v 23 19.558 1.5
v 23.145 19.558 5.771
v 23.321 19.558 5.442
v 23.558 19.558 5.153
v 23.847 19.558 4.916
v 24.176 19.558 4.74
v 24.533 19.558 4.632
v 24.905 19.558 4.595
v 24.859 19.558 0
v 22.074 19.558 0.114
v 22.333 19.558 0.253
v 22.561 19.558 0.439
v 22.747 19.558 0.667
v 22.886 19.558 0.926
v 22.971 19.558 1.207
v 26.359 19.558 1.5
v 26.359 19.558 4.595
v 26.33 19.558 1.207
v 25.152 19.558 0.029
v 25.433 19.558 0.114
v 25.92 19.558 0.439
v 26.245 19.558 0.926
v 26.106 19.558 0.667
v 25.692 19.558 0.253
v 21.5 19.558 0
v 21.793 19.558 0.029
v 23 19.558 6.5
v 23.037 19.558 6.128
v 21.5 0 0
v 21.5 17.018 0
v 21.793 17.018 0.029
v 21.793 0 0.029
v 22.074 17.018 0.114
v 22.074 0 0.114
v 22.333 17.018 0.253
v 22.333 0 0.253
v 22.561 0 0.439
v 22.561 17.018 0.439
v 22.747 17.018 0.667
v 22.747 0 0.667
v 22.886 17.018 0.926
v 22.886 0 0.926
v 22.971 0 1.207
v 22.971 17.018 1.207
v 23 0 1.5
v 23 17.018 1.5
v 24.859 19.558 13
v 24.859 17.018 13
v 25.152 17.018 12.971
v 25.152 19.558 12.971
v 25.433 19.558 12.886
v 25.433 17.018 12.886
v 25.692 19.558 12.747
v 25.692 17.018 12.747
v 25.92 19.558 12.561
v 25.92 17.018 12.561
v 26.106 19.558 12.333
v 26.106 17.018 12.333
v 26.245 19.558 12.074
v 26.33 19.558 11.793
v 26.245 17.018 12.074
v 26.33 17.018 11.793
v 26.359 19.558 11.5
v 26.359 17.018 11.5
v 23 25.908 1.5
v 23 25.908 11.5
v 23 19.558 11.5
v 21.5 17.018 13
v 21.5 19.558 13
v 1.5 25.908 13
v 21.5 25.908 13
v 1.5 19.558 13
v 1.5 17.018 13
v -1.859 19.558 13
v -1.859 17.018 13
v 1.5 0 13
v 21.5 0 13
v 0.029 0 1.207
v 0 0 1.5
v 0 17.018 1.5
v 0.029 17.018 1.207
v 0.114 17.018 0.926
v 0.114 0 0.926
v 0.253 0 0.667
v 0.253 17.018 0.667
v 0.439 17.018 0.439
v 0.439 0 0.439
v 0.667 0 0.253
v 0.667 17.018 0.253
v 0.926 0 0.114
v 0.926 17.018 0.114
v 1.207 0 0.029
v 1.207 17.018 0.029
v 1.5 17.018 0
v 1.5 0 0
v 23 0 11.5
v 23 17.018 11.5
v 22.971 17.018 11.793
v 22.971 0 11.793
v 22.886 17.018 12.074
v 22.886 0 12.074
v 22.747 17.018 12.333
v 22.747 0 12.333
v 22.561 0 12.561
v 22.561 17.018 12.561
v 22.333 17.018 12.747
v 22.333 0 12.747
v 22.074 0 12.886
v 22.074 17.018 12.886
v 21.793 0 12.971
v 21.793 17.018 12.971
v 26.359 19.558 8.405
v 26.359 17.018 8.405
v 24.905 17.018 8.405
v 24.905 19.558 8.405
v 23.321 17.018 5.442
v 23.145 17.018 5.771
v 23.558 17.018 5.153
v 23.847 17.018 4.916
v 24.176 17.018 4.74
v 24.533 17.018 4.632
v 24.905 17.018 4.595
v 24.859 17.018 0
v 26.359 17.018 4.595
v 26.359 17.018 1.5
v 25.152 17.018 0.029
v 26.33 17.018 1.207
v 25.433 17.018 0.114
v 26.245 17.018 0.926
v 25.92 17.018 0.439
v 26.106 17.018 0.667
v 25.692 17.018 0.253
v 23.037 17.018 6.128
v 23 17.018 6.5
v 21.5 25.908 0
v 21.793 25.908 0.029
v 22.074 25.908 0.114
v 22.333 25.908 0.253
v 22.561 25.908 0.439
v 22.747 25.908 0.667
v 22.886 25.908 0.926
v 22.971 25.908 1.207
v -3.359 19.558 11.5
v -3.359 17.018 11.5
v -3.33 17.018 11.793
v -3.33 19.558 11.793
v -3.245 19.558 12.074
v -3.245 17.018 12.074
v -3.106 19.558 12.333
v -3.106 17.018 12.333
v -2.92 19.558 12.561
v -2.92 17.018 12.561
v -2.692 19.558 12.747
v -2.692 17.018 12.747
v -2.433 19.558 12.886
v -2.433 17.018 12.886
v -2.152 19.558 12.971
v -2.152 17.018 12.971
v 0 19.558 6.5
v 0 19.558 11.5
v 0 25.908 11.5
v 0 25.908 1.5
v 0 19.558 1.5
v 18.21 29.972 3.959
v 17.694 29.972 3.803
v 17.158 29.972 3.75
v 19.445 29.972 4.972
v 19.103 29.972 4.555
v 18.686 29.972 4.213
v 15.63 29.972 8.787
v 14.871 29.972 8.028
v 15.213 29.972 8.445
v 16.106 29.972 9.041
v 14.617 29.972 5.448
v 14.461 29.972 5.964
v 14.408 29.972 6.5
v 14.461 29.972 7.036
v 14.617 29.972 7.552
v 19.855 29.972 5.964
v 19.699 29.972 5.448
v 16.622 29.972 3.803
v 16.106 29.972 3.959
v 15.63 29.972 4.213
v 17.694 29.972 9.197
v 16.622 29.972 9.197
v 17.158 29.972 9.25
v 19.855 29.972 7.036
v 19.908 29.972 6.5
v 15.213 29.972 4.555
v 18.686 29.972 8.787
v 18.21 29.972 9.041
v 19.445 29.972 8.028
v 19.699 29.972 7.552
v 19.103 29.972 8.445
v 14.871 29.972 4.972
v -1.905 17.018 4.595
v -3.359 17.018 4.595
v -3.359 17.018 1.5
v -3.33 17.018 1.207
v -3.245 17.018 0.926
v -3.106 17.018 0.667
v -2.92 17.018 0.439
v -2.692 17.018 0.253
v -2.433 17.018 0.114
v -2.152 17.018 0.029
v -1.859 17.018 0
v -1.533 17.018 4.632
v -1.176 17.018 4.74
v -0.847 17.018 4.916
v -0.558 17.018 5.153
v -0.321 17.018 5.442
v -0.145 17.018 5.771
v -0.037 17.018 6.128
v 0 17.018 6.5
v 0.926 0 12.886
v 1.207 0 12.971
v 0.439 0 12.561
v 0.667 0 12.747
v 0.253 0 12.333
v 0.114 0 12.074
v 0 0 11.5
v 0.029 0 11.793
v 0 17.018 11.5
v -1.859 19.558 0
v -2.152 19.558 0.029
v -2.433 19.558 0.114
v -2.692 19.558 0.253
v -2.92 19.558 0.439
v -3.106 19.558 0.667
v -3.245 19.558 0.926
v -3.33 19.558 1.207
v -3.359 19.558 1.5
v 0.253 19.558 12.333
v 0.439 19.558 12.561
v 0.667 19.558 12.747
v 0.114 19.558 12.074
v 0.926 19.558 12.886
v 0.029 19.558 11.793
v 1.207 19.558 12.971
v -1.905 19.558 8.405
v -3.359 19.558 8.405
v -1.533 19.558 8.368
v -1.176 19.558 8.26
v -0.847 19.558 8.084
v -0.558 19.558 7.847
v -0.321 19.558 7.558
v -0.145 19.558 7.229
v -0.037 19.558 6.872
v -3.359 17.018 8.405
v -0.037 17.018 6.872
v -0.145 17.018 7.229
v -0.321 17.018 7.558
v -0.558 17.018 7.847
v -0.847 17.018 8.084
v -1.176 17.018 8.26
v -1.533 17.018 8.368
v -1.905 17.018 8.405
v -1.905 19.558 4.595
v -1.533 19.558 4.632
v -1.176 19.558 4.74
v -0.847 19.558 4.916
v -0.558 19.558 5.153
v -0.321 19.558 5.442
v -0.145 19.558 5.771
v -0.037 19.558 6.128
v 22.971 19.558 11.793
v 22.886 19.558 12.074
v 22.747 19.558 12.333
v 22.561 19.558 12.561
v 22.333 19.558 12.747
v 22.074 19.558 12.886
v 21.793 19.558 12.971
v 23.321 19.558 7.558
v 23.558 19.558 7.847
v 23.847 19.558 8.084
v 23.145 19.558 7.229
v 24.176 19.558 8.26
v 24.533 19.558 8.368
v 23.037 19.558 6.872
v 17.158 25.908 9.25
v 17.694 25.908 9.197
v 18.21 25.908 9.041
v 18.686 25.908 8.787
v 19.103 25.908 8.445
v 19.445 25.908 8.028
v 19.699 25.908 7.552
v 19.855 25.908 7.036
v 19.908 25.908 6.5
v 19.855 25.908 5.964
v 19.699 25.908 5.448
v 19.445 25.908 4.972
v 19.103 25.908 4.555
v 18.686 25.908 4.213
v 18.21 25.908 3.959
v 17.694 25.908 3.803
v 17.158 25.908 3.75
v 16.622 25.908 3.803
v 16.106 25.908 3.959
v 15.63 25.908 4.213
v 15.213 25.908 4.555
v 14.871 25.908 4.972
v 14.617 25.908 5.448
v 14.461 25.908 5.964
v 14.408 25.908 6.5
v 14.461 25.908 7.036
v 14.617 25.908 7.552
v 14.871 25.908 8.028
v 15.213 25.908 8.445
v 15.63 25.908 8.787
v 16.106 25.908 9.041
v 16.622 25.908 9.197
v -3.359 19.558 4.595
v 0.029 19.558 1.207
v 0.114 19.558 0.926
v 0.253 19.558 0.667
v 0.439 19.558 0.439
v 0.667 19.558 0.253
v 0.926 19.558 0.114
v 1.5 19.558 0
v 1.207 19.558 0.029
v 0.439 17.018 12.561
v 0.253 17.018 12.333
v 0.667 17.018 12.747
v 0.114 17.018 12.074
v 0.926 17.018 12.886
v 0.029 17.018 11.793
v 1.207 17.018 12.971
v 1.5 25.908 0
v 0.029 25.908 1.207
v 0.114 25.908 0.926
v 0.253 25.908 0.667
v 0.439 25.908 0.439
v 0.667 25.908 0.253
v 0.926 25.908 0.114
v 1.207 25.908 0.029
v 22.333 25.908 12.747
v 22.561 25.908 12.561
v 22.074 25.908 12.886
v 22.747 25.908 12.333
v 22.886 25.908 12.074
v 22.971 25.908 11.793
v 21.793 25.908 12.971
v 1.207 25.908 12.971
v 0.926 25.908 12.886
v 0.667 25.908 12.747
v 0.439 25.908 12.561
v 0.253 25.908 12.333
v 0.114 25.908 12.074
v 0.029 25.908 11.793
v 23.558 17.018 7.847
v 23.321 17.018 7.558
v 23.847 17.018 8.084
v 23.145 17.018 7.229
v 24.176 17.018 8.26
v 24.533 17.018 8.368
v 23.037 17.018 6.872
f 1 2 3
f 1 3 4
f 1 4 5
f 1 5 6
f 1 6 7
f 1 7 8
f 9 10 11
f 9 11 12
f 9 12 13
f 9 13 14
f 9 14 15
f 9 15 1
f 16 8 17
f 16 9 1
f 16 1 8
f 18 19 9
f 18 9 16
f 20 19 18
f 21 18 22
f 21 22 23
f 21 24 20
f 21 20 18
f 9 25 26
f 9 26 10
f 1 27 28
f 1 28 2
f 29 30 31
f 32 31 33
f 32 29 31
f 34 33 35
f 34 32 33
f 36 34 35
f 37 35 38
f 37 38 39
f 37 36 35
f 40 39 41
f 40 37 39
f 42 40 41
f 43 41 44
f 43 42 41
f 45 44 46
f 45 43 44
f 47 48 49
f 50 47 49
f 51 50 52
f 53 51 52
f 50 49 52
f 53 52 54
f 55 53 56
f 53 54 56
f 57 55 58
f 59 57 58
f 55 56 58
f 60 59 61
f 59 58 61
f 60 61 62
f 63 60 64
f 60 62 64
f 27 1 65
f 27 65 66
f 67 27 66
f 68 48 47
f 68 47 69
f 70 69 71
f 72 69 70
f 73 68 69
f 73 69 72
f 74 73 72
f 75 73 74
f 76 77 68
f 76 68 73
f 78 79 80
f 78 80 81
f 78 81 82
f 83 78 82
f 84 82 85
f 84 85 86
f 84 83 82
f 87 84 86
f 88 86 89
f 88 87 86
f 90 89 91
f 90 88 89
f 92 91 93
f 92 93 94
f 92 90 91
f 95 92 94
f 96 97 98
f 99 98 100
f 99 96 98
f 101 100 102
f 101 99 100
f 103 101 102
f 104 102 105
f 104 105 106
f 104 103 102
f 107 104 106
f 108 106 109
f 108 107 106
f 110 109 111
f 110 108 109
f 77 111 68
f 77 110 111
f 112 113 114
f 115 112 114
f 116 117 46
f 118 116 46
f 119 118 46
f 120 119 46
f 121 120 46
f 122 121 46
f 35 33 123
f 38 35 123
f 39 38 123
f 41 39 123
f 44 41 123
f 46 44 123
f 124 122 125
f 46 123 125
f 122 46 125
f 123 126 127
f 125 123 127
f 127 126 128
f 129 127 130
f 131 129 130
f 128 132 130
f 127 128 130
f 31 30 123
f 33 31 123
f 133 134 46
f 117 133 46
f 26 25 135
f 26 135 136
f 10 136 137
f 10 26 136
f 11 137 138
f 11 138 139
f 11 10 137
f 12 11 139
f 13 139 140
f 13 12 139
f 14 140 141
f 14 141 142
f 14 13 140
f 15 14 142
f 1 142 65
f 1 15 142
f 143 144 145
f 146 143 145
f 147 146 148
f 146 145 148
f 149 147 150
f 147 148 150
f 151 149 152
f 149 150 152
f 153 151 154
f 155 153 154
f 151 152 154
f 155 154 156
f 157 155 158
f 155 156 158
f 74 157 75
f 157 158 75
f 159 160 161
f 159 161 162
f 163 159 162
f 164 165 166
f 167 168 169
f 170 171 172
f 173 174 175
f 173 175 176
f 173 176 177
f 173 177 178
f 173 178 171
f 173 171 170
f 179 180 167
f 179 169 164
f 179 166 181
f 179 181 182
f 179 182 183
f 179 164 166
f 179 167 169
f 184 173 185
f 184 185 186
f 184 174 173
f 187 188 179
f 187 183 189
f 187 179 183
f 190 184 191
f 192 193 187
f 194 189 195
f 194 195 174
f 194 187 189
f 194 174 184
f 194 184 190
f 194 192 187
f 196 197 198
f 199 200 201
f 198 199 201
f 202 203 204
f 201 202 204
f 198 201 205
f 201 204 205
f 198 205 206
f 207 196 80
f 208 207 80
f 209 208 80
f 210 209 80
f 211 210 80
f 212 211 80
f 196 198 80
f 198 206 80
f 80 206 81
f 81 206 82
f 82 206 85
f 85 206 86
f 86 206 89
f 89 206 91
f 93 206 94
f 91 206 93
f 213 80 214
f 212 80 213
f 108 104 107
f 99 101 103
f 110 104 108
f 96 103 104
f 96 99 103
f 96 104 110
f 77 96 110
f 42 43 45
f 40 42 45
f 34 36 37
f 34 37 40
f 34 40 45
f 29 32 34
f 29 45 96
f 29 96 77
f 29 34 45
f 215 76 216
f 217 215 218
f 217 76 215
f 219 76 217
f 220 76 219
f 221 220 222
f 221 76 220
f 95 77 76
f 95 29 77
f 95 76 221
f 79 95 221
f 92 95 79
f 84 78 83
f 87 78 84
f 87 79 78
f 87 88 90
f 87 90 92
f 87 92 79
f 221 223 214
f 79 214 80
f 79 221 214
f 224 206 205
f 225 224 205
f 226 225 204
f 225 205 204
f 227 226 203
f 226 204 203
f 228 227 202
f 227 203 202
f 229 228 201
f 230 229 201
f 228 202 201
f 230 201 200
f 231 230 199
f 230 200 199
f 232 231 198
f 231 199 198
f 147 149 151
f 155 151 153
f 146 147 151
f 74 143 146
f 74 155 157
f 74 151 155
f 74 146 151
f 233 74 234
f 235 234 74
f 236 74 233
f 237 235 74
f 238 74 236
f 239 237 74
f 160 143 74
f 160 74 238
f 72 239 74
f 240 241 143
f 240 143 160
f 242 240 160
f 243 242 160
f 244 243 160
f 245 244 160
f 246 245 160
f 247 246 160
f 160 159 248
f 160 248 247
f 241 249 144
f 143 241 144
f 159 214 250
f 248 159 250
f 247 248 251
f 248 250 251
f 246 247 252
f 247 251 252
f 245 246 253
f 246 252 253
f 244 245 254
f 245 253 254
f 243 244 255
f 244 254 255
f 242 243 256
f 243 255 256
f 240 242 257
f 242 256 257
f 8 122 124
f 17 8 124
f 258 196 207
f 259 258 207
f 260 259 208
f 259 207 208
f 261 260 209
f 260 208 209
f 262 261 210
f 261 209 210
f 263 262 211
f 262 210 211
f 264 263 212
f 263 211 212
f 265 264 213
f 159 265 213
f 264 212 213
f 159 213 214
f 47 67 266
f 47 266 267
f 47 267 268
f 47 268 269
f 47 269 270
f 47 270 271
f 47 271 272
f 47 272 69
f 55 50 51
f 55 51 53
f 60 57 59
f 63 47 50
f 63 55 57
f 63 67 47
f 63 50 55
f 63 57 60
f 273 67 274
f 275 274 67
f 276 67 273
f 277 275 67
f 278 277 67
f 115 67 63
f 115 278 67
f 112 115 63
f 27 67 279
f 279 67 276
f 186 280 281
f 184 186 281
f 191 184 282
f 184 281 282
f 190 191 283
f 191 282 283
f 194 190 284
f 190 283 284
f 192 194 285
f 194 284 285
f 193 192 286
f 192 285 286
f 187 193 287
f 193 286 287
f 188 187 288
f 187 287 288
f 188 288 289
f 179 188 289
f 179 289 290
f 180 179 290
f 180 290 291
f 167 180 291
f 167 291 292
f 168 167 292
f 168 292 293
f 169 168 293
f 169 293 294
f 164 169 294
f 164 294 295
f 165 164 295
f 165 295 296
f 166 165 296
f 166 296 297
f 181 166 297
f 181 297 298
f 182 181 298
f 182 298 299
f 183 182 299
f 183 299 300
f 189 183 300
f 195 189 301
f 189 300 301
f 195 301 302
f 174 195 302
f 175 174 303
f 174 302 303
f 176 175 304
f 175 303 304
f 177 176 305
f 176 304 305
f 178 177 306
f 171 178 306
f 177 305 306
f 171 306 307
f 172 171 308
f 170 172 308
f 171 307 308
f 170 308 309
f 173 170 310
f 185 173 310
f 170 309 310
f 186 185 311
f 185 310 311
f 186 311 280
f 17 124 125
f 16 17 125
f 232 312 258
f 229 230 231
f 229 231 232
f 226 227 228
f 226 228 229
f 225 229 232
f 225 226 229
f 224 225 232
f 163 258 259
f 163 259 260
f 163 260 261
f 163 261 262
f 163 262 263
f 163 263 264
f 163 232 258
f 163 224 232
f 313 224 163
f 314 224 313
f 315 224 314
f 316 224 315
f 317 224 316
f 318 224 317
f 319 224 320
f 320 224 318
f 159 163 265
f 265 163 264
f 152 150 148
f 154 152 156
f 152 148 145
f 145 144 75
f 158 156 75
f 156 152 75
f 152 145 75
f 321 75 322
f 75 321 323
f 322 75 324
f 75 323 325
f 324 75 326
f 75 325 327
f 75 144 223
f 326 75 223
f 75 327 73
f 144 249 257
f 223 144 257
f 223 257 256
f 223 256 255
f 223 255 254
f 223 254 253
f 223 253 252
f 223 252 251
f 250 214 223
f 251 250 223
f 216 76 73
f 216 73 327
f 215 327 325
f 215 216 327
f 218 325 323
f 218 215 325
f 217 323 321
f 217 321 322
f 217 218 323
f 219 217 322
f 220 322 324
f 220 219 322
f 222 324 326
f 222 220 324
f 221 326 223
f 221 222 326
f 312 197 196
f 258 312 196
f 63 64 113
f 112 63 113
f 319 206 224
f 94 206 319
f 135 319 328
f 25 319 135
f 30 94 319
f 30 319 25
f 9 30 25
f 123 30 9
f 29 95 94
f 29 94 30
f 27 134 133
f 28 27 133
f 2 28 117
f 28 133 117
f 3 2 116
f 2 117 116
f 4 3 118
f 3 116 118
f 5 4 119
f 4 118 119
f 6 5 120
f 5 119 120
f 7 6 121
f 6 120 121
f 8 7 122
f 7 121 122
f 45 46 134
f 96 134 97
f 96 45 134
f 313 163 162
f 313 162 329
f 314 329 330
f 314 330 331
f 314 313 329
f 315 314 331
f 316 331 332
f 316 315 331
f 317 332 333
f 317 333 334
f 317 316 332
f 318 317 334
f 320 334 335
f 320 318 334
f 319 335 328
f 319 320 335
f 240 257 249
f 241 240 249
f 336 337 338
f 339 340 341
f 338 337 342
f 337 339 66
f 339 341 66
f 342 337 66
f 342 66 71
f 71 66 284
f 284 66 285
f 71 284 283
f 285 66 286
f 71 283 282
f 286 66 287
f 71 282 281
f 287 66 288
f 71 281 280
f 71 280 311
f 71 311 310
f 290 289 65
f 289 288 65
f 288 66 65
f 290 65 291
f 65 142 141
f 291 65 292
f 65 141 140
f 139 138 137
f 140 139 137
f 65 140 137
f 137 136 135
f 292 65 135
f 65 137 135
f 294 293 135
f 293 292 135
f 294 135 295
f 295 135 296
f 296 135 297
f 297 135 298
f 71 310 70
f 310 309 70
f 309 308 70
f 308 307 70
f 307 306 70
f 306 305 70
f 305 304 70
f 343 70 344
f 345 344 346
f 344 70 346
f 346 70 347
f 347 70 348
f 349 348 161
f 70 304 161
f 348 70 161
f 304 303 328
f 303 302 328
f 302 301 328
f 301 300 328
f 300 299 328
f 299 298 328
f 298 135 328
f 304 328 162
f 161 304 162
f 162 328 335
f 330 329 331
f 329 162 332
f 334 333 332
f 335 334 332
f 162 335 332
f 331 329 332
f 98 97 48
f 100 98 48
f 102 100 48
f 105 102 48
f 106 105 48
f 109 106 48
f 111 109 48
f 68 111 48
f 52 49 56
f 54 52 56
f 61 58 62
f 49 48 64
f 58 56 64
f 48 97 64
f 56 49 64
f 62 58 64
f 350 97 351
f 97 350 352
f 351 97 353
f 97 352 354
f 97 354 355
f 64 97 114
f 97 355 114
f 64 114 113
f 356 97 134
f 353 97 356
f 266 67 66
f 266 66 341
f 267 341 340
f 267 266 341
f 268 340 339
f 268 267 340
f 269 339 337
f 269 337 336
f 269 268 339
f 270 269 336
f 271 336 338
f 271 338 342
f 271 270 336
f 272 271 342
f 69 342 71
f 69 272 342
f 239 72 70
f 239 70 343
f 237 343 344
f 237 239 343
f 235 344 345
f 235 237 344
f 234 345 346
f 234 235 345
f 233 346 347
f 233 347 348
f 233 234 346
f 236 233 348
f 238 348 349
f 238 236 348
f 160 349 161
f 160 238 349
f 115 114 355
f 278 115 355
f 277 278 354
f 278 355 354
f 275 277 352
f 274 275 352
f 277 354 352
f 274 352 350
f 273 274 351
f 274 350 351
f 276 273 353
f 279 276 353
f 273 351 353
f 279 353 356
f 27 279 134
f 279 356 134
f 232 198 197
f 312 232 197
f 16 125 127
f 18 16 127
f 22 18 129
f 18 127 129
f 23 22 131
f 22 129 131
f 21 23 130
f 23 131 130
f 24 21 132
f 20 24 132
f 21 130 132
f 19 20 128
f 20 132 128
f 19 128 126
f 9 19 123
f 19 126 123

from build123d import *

# Parameters (mm, degrees)
BOSS_EXTRUDE1_DEPTH = 17.018
BOSS_EXTRUDE2_DEPTH = 2.54
BOSS_EXTRUDE3_DEPTH = 6.35
SKETCH4_4_R         = 2.75
BOSS_EXTRUDE4_DEPTH = 10.414


with BuildPart() as part:
    # Sketch2 → Boss-Extrude1 (new body)
    with BuildSketch(Plane(origin=(0, 0, 0), x_dir=(1, 0, 0), z_dir=(0, 1, 0))):
        with BuildLine():
            Line((1.5, 0), (21.5, 0))
            ThreePointArc((21.5, 0), (22.560660172, -0.439339828), (23, -1.5))
            Line((23, -1.5), (23, -11.5))
            ThreePointArc((23, -11.5), (22.560660172, -12.560660172), (21.5, -13))
            Line((21.5, -13), (1.5, -13))
            ThreePointArc((1.5, -13), (0.439339828, -12.560660172), (0, -11.5))
            Line((0, -11.5), (0, -1.5))
            ThreePointArc((0, -1.5), (0.439339828, -0.439339828), (1.5, 0))
        make_face()
    extrude(amount=BOSS_EXTRUDE1_DEPTH)

    # Sketch3 → Boss-Extrude2 (add)
    with BuildSketch(Plane(origin=(0, 17.018, 0), x_dir=(1, 0, 0), z_dir=(0, 1, 0))):
        with BuildLine():
            ThreePointArc((-1.859, 0), (-2.919660172, -0.439339828), (-3.359, -1.5))
            Line((-3.359, -1.5), (-3.359, -4.595))
            Line((-3.359, -4.595), (-1.905, -4.595))
            ThreePointArc((-1.905, -4.595), (0, -6.5), (-1.905, -8.405))
            Line((-1.905, -8.405), (-3.359, -8.405))
            Line((-3.359, -8.405), (-3.359, -11.5))
            ThreePointArc((-3.359, -11.5), (-2.919660172, -12.560660172), (-1.859, -13))
            Line((-1.859, -13), (24.859, -13))
            ThreePointArc((24.859, -13), (25.919660172, -12.560660172), (26.359, -11.5))
            Line((26.359, -11.5), (26.359, -8.405))
            Line((26.359, -8.405), (24.905, -8.405))
            ThreePointArc((24.905, -8.405), (23, -6.5), (24.905, -4.595))
            Line((24.905, -4.595), (26.359, -4.595))
            Line((26.359, -4.595), (26.359, -1.5))
            ThreePointArc((26.359, -1.5), (25.919660172, -0.439339828), (24.859, 0))
            Line((24.859, 0), (-1.859, 0))
        make_face()
    extrude(amount=BOSS_EXTRUDE2_DEPTH)

    # Sketch4 → Boss-Extrude3 (add)
    with BuildSketch(Plane(origin=(0, 19.558, 0), x_dir=(1, 0, 0), z_dir=(0, 1, 0))):
        with BuildLine():
            Line((1.5, 0), (21.5, 0))
            ThreePointArc((21.5, 0), (22.560660172, -0.439339828), (23, -1.5))
            Line((23, -1.5), (23, -11.5))
            ThreePointArc((23, -11.5), (22.560660172, -12.560660172), (21.5, -13))
            Line((21.5, -13), (1.5, -13))
            ThreePointArc((1.5, -13), (0.439339828, -12.560660172), (0, -11.5))
            Line((0, -11.5), (0, -1.5))
            ThreePointArc((0, -1.5), (0.439339828, -0.439339828), (1.5, 0))
        make_face()
    extrude(amount=BOSS_EXTRUDE3_DEPTH)

    # Sketch4<4> → Boss-Extrude4 (add)
    with BuildSketch(Plane(origin=(0, 19.558, 0), x_dir=(1, 0, 0), z_dir=(0, 1, 0))):
        with Locations((17.158, -6.5)):
            Circle(SKETCH4_4_R)
    extrude(amount=BOSS_EXTRUDE4_DEPTH)


solid = part.part
